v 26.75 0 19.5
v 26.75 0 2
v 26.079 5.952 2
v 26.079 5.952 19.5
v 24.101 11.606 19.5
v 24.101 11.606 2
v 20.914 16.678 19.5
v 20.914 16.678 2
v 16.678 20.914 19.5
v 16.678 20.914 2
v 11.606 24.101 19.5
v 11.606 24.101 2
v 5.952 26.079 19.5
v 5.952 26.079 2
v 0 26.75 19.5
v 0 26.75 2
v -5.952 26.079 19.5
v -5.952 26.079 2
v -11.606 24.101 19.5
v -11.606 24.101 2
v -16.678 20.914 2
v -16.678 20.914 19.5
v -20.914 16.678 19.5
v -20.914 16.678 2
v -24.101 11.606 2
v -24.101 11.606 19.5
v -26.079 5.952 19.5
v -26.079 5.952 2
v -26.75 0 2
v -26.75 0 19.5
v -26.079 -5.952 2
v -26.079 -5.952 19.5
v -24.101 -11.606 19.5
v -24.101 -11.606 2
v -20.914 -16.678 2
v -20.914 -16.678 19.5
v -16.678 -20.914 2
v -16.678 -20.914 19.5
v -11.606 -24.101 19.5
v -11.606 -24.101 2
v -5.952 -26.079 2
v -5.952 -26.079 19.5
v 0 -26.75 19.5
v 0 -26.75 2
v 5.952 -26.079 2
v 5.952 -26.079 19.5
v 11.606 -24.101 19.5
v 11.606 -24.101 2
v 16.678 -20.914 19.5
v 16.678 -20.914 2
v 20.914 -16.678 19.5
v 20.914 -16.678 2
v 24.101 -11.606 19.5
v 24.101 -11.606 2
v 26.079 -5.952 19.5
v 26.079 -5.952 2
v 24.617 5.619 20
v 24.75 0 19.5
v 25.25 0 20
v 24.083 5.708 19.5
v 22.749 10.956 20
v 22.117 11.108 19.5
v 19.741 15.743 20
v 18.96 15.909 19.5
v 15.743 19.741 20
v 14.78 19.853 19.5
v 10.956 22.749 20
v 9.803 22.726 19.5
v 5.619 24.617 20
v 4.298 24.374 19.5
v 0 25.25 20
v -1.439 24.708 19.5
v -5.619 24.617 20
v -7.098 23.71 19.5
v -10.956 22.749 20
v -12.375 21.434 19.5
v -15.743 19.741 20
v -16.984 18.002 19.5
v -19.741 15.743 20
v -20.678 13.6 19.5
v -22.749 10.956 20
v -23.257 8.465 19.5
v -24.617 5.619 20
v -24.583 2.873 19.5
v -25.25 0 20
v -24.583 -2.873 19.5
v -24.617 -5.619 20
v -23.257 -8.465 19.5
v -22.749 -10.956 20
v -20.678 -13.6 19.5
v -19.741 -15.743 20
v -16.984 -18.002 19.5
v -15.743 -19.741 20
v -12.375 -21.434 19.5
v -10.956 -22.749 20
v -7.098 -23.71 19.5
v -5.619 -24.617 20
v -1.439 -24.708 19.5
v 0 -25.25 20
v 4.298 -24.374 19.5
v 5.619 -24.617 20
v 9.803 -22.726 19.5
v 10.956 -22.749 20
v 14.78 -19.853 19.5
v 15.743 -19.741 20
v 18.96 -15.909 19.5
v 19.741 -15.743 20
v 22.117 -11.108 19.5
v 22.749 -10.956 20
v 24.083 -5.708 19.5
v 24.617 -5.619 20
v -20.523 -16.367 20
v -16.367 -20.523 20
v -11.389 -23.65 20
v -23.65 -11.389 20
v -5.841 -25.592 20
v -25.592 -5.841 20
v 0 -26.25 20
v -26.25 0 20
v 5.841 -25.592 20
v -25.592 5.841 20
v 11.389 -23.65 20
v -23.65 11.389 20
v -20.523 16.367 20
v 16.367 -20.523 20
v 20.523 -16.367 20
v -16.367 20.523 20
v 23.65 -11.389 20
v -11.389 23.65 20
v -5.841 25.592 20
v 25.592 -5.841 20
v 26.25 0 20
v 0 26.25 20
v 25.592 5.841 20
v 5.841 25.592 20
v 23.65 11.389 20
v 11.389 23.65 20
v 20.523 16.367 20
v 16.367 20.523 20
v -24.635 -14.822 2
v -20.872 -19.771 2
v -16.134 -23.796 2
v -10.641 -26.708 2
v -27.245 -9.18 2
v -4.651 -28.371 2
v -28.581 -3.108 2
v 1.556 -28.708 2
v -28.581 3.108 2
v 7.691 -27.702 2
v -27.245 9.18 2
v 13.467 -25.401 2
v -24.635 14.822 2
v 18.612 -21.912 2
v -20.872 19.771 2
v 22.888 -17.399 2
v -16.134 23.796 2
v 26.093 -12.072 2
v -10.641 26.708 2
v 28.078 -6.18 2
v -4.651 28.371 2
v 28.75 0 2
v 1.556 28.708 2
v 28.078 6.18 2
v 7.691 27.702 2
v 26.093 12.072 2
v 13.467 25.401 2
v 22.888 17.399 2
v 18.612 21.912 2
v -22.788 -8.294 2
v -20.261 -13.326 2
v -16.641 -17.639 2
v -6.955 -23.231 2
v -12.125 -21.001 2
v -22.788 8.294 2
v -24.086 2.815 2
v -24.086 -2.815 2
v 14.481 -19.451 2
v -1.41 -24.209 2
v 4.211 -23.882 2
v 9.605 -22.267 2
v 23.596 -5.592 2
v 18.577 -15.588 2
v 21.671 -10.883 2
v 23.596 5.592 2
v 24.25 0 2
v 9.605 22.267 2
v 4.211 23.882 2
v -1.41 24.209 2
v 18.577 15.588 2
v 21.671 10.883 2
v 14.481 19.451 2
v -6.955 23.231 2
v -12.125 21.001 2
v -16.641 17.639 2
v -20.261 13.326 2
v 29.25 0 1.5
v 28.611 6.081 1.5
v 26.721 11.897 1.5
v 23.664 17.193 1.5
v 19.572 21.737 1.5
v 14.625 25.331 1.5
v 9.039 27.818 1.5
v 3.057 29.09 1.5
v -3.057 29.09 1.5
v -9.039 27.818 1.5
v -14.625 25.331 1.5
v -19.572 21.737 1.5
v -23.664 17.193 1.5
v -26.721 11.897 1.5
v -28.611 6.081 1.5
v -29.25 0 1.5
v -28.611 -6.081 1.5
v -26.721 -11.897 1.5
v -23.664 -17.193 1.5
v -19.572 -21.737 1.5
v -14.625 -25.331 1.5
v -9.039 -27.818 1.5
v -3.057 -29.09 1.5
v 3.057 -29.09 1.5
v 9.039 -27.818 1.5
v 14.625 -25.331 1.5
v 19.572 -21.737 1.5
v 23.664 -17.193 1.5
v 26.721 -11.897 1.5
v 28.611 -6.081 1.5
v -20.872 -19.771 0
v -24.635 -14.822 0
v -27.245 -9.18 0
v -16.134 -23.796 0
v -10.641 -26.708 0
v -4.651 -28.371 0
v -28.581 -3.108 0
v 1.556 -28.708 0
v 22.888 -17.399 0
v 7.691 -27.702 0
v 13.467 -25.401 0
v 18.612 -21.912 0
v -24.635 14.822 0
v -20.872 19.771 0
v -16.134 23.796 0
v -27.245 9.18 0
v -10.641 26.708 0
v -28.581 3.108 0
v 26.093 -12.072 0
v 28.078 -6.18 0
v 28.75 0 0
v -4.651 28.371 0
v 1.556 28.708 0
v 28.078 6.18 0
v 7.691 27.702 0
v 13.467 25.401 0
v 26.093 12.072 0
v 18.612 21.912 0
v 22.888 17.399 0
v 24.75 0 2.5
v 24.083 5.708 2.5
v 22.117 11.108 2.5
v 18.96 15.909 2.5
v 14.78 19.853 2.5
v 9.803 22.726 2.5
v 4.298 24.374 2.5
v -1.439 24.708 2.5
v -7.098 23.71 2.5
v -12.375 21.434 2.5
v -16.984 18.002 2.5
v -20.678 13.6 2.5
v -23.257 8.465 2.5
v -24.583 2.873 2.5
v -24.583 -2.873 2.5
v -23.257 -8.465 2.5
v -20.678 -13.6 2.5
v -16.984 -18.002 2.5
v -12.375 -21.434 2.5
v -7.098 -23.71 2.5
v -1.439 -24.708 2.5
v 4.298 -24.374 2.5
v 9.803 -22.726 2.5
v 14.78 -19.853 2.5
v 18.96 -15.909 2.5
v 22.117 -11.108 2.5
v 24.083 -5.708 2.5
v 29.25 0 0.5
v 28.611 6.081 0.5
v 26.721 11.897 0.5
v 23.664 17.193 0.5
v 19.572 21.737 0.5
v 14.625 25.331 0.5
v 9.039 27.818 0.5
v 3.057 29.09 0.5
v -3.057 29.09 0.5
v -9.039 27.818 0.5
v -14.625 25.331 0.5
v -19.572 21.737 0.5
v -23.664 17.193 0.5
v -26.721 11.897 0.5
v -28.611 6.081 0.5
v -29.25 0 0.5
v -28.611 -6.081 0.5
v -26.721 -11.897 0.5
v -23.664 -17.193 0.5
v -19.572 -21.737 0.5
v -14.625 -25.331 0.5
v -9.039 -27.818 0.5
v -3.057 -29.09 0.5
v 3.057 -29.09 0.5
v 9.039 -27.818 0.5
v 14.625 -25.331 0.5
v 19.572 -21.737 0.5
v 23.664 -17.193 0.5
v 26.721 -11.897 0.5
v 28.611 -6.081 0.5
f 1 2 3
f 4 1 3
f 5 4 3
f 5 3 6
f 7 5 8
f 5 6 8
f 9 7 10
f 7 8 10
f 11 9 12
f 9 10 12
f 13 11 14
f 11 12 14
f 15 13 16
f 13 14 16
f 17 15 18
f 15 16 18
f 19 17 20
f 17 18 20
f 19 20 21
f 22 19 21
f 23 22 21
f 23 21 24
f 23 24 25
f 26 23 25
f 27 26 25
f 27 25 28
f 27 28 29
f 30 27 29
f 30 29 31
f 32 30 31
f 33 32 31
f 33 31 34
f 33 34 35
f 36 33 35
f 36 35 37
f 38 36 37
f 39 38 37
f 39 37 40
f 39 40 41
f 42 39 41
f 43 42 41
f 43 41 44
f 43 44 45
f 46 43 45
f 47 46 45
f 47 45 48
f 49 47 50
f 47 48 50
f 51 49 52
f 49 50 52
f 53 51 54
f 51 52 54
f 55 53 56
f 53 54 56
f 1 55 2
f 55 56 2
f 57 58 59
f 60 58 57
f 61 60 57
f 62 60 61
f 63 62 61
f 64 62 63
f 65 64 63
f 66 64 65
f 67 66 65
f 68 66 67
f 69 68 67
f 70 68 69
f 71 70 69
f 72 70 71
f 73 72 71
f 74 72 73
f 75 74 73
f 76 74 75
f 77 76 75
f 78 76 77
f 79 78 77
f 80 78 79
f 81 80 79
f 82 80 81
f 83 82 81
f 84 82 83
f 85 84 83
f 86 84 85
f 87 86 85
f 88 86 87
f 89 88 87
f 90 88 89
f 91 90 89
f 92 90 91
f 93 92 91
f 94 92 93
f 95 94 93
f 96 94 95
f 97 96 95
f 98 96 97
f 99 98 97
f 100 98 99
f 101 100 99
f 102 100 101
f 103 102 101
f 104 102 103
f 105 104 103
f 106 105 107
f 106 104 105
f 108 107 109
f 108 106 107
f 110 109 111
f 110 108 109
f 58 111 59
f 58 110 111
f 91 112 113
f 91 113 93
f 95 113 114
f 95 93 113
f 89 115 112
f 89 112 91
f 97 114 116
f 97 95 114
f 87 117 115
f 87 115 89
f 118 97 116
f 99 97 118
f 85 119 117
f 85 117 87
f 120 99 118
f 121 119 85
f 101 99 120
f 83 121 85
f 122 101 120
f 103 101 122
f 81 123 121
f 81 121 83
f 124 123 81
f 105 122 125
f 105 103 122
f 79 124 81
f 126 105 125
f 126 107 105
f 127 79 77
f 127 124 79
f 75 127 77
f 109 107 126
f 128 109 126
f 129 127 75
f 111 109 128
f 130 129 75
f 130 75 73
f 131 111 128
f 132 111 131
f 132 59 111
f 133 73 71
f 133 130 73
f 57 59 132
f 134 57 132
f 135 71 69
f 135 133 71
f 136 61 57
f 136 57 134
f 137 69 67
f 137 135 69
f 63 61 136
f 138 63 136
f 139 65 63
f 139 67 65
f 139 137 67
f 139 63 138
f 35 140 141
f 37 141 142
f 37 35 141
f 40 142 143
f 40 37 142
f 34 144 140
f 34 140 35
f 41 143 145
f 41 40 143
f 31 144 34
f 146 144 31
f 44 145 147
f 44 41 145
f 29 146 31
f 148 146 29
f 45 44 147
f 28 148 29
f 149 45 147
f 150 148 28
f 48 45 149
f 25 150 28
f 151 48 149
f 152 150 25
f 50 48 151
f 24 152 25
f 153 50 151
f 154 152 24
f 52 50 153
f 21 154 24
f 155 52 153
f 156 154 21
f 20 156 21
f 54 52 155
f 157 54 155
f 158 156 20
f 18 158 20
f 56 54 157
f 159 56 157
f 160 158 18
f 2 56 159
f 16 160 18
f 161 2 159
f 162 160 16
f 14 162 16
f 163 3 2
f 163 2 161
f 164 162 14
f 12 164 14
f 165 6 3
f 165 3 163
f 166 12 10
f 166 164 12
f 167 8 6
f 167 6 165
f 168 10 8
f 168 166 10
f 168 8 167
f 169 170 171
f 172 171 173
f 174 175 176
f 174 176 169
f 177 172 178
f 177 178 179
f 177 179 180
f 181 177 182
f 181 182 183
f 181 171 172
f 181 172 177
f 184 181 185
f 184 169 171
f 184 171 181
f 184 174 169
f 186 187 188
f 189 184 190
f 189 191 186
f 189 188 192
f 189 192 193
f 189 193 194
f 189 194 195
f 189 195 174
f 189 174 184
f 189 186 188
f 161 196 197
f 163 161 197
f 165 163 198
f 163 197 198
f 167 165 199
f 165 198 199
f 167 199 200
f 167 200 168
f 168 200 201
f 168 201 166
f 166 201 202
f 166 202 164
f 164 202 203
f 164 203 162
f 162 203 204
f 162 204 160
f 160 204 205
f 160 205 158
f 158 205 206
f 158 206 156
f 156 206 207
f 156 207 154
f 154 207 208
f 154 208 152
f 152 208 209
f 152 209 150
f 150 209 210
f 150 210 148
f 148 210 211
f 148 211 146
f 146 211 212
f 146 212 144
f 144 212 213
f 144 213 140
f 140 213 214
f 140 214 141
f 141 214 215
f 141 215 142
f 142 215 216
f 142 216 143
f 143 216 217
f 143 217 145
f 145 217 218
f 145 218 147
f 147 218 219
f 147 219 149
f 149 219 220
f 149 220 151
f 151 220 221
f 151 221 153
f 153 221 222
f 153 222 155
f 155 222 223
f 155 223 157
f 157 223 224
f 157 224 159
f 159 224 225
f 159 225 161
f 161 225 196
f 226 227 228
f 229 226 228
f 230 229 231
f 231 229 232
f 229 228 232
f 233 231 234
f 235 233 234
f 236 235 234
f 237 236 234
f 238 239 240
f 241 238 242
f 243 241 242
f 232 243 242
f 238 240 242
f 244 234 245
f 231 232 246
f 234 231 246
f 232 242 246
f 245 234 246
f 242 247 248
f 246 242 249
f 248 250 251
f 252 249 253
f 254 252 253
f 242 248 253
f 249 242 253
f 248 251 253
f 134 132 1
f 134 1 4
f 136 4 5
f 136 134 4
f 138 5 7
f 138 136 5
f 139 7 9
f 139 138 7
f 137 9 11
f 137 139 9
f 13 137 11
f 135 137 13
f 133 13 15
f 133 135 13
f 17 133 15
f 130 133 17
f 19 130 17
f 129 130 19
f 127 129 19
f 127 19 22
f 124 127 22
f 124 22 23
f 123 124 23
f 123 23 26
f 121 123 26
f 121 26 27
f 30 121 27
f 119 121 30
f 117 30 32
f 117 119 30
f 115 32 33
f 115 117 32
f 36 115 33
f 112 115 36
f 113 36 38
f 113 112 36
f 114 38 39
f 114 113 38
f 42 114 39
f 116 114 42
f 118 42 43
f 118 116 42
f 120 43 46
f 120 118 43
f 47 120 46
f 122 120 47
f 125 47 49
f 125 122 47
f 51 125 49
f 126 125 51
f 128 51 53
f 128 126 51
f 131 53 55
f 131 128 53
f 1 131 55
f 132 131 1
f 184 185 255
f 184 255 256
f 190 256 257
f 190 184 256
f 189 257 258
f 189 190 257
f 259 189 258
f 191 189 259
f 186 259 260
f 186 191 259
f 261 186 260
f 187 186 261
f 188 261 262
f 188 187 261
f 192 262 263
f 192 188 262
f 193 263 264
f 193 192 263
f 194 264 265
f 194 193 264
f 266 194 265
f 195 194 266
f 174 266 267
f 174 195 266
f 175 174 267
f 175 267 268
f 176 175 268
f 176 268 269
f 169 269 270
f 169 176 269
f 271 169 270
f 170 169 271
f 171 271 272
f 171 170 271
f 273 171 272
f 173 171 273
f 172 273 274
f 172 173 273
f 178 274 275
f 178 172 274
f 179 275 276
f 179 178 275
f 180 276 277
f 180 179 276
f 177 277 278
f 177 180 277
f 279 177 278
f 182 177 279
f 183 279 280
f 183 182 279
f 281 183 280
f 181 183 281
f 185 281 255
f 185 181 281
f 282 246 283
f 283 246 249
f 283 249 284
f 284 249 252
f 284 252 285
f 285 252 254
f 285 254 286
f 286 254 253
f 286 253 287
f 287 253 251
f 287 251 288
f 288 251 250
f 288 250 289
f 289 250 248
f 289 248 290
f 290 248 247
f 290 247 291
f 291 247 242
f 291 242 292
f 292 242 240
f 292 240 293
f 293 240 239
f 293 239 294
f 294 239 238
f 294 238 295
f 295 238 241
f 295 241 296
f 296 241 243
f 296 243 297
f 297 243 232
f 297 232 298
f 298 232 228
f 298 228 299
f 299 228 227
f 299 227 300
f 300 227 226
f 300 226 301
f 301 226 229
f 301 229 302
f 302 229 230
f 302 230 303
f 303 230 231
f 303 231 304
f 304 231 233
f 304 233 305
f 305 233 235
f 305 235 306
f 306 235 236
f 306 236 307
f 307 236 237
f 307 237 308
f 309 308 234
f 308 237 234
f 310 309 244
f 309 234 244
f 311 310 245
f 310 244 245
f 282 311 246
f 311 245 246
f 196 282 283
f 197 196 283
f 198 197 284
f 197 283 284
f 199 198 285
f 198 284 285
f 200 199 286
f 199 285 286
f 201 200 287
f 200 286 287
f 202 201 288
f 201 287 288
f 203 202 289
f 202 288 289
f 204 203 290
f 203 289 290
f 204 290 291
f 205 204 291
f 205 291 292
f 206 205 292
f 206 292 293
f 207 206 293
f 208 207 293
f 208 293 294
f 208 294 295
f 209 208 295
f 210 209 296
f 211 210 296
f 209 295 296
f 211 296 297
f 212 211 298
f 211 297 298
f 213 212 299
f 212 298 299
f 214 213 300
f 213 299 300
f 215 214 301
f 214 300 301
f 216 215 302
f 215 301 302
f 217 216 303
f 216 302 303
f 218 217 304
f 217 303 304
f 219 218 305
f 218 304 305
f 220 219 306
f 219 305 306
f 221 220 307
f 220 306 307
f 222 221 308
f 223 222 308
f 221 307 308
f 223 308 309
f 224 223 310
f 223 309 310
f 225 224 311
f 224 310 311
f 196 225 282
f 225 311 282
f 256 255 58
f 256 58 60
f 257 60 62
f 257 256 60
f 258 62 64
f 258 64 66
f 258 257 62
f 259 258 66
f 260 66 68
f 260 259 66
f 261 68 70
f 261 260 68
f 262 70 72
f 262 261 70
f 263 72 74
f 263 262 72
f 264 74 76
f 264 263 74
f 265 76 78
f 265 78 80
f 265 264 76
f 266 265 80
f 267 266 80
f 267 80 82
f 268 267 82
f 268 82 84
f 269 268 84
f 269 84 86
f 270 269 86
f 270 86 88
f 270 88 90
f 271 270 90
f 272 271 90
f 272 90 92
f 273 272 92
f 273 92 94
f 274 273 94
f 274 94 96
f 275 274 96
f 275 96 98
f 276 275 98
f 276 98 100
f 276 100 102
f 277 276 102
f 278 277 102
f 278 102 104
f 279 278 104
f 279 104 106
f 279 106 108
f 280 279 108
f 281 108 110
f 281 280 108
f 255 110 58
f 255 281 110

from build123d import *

# Parameters (mm, degrees)
SKETCH2_R           = 26.75
SKETCH2_R_2         = 29.25
SKETCH2_R_3         = 24.75
BOSS_EXTRUDE1_DEPTH = 2
SKETCH2_3_R         = 26.75
SKETCH2_3_R_2       = 24.75
BOSS_EXTRUDE2_DEPTH = 20
CHAMFER1_SIZE       = 0.5


with BuildPart() as part:
    # Sketch2 → Boss-Extrude1 (new body)
    with BuildSketch(Plane.XY):
        Circle(SKETCH2_R)
        Circle(SKETCH2_R_2)
        Circle(SKETCH2_R, mode=Mode.SUBTRACT)
        Circle(SKETCH2_R_3)
    extrude(amount=BOSS_EXTRUDE1_DEPTH)

    # Sketch2<3> → Boss-Extrude2 (add)
    with BuildSketch(Plane.XY):
        Circle(SKETCH2_3_R)
        Circle(SKETCH2_3_R_2, mode=Mode.SUBTRACT)
    extrude(amount=BOSS_EXTRUDE2_DEPTH)

    # Chamfer1
    chamfer1_edges = [part.edges().sort_by_distance(p)[0] for p in [
        (-26.75, 0, 20),
        (-29.25, 0, 0),
        (-29.25, 0, 2),
        (-24.75, 0, 2),
        (-24.75, 0, 20),
    ]]
    chamfer(chamfer1_edges, length=CHAMFER1_SIZE)


solid = part.part
